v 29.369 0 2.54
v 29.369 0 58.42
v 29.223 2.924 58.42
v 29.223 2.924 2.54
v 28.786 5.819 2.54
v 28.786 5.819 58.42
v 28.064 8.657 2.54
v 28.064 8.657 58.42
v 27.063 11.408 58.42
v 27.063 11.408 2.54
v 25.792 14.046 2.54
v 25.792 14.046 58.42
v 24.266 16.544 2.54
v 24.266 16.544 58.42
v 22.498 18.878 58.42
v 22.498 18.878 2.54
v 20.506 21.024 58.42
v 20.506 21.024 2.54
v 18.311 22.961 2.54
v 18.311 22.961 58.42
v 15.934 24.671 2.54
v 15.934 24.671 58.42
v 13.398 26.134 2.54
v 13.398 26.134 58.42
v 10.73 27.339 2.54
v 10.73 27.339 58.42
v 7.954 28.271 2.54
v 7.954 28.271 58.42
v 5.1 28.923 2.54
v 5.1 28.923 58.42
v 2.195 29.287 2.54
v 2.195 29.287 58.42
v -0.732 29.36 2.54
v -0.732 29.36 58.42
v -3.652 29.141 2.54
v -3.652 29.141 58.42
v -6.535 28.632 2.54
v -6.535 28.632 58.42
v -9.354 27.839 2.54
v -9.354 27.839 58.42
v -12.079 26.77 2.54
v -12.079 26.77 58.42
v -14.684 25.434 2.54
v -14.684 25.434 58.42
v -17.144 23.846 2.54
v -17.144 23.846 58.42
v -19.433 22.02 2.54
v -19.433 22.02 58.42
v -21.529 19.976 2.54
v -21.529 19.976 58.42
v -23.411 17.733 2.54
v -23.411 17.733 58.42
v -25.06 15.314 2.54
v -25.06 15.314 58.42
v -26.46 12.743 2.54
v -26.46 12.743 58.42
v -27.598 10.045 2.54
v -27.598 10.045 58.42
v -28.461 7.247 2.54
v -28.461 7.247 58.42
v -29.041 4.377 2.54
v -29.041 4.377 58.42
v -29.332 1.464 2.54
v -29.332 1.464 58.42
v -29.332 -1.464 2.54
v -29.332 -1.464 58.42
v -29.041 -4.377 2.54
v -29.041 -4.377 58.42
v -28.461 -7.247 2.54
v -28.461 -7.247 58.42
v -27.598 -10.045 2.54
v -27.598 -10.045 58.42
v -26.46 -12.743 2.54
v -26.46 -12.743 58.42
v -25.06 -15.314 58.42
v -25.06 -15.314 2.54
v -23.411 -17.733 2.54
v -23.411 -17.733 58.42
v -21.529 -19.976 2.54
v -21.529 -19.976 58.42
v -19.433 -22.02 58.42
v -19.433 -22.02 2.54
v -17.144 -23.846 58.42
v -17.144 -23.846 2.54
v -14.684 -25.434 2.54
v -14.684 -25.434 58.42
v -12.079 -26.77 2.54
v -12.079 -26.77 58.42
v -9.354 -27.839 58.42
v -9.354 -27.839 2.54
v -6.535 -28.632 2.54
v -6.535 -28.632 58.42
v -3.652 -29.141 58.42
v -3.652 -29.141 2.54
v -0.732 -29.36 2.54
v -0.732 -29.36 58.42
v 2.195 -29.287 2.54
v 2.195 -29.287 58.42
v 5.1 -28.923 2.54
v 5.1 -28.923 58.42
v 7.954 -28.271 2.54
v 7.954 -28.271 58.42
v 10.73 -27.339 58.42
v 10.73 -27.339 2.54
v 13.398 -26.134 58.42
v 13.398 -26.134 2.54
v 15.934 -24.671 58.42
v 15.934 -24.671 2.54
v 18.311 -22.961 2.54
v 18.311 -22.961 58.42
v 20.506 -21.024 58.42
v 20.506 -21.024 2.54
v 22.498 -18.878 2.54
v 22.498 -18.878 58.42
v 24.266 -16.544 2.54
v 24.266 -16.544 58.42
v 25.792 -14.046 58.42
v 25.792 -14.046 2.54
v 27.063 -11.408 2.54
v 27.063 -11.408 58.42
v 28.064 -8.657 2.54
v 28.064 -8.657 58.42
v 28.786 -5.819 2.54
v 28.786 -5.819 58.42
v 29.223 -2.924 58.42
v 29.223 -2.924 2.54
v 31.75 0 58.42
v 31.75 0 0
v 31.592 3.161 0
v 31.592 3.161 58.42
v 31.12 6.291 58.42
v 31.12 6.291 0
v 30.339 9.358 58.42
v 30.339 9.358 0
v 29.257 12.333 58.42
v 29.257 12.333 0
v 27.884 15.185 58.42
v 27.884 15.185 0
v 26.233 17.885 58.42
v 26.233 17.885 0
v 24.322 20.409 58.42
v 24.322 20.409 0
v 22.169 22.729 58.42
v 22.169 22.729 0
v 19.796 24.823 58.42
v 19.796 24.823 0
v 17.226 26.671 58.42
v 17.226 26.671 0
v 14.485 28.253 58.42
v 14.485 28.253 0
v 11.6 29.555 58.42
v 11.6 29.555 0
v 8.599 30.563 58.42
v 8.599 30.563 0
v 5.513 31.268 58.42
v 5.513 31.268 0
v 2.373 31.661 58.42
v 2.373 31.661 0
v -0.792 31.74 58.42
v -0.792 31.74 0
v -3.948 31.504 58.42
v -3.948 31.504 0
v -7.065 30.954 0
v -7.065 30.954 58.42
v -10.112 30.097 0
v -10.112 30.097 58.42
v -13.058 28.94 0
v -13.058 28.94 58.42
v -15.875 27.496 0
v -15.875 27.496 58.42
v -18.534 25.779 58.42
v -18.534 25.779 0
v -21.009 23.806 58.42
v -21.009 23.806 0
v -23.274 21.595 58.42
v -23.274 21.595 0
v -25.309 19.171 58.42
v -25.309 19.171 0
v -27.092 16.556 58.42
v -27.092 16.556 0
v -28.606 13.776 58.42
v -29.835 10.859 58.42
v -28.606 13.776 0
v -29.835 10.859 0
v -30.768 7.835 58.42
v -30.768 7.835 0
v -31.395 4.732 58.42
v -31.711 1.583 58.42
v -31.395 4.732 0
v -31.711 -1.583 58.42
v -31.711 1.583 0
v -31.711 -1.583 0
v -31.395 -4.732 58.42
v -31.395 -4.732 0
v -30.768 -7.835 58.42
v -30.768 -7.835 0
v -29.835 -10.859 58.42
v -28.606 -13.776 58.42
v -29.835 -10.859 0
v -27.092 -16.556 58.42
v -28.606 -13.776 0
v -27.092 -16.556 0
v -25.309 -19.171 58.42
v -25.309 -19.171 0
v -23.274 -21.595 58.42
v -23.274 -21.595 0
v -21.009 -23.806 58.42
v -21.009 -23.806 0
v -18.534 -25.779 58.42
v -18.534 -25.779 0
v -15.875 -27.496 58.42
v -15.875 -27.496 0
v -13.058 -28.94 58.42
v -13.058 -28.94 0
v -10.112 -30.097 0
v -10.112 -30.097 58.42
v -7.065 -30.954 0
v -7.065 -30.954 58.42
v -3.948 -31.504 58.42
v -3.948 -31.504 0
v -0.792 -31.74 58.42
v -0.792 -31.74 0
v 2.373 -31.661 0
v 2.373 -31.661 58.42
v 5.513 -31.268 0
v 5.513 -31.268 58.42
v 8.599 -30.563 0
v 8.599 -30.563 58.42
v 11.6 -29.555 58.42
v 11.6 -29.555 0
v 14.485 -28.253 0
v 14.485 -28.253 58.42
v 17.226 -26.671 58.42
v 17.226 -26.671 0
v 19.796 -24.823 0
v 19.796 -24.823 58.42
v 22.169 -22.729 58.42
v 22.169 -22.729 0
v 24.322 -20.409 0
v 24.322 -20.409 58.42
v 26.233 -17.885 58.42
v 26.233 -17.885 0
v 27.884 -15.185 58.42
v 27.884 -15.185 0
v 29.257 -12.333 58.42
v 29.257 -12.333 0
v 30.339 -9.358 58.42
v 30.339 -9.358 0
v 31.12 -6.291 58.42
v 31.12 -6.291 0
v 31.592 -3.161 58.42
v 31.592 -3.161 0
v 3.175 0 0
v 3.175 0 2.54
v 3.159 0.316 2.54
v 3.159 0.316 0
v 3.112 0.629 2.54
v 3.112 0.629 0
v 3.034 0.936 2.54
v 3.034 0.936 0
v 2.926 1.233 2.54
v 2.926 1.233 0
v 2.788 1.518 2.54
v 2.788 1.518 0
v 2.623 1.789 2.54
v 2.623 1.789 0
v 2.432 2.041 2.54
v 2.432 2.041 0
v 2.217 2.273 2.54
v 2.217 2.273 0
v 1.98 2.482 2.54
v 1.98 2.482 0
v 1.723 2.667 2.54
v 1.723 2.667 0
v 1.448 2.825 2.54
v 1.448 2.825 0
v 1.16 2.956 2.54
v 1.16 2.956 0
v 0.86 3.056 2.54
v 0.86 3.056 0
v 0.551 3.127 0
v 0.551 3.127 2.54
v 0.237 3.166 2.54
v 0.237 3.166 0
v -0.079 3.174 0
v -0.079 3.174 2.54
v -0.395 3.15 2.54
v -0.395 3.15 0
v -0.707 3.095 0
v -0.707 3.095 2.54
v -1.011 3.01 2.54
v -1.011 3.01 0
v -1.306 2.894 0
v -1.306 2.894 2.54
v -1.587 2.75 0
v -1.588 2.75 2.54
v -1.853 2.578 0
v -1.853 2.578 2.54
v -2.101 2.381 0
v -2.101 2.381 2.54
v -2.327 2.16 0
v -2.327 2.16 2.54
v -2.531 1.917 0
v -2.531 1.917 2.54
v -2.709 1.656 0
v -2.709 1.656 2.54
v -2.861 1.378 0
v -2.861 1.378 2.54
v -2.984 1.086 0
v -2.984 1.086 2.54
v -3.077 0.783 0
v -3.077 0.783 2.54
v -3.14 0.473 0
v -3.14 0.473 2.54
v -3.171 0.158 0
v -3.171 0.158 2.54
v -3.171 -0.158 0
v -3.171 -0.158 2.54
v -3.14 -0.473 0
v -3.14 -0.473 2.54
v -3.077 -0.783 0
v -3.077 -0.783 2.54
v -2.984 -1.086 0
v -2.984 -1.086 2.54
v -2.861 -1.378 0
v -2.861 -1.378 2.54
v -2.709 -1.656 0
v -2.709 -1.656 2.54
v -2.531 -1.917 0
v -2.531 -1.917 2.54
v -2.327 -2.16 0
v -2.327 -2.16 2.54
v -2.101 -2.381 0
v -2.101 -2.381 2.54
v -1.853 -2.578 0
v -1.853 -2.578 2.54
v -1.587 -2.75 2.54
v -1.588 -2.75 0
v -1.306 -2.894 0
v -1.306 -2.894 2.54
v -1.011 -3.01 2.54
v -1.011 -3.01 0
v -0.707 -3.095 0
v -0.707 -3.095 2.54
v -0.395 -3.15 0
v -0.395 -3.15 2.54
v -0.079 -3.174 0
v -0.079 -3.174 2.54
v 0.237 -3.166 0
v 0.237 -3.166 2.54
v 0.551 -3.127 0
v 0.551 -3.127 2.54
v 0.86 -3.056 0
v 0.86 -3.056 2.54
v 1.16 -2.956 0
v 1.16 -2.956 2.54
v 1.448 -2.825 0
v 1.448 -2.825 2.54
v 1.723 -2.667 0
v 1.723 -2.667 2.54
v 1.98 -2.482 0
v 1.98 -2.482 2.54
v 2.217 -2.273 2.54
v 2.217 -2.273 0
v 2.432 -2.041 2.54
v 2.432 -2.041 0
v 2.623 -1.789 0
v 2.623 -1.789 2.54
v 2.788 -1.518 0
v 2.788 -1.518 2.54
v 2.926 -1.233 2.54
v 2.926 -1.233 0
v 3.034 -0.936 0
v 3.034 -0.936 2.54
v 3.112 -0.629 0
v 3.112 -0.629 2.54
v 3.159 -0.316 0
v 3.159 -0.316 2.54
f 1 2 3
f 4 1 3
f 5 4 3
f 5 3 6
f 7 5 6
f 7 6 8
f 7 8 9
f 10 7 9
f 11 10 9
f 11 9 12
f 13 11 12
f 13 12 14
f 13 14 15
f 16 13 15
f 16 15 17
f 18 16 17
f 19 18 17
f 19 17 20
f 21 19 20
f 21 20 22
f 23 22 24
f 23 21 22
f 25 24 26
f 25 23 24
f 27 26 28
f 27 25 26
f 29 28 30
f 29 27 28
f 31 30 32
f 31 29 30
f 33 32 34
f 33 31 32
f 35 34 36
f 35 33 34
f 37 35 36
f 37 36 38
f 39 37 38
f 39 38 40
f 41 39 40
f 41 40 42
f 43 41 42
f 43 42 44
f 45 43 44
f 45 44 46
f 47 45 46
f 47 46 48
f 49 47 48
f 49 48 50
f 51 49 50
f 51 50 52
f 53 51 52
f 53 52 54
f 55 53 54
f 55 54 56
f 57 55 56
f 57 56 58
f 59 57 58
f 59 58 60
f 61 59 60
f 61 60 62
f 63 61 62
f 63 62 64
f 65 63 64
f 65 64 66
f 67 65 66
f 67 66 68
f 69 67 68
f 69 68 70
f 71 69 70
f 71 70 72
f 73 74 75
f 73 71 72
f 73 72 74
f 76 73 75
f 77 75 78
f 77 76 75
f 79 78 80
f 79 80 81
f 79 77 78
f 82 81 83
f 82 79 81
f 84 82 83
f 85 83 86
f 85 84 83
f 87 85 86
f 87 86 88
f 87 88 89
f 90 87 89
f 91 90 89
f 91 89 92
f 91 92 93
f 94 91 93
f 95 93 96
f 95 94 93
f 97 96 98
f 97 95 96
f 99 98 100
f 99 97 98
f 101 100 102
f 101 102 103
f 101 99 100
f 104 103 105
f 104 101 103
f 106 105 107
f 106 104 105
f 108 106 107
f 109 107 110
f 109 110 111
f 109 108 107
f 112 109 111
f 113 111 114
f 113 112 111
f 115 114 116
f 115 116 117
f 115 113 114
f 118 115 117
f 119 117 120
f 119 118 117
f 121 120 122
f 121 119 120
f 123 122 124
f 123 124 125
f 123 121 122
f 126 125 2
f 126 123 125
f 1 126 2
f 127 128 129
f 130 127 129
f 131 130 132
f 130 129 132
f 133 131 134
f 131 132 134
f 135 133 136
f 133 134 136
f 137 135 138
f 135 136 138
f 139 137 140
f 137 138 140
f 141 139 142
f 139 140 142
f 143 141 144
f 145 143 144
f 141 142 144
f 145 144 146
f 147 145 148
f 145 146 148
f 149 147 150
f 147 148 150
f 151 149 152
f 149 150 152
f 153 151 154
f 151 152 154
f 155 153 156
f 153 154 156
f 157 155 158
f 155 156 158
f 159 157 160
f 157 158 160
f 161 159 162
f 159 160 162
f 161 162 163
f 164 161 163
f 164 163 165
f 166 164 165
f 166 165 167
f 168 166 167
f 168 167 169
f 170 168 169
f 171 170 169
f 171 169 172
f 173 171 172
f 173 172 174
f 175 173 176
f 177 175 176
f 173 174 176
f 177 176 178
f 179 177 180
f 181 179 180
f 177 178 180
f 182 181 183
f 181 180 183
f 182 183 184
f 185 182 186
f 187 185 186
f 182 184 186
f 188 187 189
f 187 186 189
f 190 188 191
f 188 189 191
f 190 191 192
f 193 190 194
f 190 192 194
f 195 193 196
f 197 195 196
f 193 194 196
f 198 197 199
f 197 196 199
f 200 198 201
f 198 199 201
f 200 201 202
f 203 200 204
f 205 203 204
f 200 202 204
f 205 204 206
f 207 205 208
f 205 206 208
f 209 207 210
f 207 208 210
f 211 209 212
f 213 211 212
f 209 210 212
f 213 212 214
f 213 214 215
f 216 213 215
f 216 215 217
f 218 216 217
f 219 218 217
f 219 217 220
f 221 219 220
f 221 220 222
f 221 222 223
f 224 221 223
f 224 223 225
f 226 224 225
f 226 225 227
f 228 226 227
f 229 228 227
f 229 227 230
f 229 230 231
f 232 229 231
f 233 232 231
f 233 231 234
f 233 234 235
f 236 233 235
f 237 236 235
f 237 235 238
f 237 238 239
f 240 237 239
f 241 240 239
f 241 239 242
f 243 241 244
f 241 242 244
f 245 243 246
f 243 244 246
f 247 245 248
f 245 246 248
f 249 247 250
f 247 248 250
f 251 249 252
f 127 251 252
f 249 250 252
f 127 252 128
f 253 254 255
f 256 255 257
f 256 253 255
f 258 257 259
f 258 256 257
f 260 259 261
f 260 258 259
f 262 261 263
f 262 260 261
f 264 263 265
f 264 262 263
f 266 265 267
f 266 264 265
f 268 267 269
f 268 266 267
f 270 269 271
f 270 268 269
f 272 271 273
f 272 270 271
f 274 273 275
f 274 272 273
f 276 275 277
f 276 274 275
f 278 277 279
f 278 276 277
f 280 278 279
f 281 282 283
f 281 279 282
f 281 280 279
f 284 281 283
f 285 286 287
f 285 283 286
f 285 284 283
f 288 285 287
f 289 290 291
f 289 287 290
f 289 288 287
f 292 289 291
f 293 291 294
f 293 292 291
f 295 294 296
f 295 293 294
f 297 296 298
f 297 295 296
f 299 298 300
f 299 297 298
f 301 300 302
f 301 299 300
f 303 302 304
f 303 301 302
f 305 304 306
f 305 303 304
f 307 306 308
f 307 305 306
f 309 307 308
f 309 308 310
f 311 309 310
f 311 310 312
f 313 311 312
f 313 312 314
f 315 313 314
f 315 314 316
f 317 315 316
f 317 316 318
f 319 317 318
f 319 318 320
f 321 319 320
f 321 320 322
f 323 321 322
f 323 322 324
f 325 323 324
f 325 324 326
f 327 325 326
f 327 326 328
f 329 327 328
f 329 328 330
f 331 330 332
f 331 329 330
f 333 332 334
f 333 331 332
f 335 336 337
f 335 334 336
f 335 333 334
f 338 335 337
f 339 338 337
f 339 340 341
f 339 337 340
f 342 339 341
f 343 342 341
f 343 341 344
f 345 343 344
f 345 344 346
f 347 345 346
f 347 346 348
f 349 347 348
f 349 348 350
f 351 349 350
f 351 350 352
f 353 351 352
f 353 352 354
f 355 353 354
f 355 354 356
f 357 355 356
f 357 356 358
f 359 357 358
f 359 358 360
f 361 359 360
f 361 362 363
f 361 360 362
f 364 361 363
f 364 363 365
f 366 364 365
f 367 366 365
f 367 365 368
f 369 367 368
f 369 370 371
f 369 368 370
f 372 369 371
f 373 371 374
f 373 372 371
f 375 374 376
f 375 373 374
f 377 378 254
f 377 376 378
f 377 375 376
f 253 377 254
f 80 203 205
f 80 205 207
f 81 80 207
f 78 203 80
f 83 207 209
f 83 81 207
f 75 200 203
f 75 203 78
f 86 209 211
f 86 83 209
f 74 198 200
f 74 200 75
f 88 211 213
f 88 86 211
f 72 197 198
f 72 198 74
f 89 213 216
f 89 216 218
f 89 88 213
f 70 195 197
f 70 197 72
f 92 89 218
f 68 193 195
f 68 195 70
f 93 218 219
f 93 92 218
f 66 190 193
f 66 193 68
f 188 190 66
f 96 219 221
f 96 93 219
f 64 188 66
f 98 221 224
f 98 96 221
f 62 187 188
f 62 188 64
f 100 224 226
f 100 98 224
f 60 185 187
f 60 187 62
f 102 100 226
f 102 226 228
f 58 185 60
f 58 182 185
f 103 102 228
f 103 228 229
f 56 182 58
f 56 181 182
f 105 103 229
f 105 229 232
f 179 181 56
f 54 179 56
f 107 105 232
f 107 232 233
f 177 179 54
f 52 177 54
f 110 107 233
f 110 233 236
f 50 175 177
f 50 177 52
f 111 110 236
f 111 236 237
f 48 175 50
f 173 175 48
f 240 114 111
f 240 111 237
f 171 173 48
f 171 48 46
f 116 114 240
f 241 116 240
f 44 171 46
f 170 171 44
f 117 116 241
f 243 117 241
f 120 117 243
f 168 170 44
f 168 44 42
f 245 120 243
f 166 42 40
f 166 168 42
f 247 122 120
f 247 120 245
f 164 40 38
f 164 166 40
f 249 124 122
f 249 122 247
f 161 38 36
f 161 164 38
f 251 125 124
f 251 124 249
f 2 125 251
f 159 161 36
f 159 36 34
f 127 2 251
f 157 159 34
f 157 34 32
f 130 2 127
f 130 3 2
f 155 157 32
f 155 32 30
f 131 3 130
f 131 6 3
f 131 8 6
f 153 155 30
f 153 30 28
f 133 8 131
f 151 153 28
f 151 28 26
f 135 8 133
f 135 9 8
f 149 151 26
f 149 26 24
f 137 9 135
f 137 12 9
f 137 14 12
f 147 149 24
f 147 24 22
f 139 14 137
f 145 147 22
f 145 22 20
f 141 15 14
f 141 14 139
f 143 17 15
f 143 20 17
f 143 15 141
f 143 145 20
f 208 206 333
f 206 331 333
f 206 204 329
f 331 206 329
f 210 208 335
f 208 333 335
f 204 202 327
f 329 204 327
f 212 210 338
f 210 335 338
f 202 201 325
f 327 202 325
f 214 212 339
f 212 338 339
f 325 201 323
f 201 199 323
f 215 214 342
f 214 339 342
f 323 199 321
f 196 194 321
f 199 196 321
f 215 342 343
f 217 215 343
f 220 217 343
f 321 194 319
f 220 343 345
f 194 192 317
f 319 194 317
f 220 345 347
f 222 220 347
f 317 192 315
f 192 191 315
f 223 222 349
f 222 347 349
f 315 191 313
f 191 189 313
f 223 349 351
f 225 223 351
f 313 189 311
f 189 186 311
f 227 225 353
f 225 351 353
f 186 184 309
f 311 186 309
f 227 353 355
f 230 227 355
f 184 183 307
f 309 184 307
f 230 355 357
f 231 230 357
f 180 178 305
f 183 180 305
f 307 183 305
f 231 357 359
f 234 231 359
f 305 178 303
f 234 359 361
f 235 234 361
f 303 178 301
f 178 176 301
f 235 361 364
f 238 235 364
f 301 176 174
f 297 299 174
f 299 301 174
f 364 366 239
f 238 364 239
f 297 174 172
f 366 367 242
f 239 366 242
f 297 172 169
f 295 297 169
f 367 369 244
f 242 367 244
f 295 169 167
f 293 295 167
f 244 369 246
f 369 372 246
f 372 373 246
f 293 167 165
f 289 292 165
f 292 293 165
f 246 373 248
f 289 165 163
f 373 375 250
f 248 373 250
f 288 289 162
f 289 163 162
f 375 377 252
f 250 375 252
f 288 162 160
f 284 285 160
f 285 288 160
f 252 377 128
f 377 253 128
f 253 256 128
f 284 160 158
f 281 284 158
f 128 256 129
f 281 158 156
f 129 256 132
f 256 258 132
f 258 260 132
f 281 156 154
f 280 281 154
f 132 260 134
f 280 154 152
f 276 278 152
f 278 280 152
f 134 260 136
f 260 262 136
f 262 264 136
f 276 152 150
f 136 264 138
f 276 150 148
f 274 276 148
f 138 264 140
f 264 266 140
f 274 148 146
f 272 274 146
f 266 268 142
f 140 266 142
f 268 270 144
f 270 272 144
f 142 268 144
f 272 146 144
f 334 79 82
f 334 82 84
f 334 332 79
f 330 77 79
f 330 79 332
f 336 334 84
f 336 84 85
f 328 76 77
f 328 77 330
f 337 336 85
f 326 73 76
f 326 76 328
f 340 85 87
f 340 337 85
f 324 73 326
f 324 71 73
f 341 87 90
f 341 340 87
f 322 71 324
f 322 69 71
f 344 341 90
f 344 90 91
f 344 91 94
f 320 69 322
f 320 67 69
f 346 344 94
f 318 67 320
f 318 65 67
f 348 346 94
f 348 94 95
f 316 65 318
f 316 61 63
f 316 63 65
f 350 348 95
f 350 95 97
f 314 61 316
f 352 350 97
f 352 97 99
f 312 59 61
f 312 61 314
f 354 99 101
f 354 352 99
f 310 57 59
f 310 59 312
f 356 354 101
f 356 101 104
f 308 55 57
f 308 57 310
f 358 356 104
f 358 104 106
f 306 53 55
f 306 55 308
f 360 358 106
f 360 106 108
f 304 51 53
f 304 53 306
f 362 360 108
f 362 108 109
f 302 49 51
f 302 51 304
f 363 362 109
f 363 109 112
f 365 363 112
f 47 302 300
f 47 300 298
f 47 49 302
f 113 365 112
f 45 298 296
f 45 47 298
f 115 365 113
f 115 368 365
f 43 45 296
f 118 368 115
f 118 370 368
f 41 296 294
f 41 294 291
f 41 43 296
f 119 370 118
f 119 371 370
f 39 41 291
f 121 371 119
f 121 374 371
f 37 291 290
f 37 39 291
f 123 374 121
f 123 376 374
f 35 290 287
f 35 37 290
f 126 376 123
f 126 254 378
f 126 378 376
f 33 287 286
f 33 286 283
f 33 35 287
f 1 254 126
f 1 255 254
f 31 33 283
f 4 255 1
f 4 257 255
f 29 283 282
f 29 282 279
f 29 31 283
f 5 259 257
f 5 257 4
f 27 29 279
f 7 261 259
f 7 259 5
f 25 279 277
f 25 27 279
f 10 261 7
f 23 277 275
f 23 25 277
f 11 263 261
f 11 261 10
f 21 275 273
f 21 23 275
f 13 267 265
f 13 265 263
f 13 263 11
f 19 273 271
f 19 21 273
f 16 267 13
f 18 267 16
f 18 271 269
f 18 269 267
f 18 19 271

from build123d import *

# Parameters (mm, degrees)
F1_R     = 31.75
F1_R_2   = 29.36875
F2_DEPTH = 58.42
F0_R     = 29.36875
F4_DEPTH = 2.54
F5_R     = 3.175
F6_DEPTH = 58.421


with BuildPart() as f2:
    # F1 (on face) → F2 (new body)
    with BuildSketch(Plane.XY):
        Circle(F1_R)
        Circle(F1_R_2, mode=Mode.SUBTRACT)
    extrude(amount=F2_DEPTH)

    # F0 (on Top) → F4 (join)
    with BuildSketch(Plane.XY):
        Circle(F0_R)
    extrude(amount=F4_DEPTH)

    # F5 (on face) → F6 (cut, through all)
    with BuildSketch(Plane.XY):
        Circle(F5_R)
    extrude(amount=F6_DEPTH, mode=Mode.SUBTRACT)


solid = f2.part
